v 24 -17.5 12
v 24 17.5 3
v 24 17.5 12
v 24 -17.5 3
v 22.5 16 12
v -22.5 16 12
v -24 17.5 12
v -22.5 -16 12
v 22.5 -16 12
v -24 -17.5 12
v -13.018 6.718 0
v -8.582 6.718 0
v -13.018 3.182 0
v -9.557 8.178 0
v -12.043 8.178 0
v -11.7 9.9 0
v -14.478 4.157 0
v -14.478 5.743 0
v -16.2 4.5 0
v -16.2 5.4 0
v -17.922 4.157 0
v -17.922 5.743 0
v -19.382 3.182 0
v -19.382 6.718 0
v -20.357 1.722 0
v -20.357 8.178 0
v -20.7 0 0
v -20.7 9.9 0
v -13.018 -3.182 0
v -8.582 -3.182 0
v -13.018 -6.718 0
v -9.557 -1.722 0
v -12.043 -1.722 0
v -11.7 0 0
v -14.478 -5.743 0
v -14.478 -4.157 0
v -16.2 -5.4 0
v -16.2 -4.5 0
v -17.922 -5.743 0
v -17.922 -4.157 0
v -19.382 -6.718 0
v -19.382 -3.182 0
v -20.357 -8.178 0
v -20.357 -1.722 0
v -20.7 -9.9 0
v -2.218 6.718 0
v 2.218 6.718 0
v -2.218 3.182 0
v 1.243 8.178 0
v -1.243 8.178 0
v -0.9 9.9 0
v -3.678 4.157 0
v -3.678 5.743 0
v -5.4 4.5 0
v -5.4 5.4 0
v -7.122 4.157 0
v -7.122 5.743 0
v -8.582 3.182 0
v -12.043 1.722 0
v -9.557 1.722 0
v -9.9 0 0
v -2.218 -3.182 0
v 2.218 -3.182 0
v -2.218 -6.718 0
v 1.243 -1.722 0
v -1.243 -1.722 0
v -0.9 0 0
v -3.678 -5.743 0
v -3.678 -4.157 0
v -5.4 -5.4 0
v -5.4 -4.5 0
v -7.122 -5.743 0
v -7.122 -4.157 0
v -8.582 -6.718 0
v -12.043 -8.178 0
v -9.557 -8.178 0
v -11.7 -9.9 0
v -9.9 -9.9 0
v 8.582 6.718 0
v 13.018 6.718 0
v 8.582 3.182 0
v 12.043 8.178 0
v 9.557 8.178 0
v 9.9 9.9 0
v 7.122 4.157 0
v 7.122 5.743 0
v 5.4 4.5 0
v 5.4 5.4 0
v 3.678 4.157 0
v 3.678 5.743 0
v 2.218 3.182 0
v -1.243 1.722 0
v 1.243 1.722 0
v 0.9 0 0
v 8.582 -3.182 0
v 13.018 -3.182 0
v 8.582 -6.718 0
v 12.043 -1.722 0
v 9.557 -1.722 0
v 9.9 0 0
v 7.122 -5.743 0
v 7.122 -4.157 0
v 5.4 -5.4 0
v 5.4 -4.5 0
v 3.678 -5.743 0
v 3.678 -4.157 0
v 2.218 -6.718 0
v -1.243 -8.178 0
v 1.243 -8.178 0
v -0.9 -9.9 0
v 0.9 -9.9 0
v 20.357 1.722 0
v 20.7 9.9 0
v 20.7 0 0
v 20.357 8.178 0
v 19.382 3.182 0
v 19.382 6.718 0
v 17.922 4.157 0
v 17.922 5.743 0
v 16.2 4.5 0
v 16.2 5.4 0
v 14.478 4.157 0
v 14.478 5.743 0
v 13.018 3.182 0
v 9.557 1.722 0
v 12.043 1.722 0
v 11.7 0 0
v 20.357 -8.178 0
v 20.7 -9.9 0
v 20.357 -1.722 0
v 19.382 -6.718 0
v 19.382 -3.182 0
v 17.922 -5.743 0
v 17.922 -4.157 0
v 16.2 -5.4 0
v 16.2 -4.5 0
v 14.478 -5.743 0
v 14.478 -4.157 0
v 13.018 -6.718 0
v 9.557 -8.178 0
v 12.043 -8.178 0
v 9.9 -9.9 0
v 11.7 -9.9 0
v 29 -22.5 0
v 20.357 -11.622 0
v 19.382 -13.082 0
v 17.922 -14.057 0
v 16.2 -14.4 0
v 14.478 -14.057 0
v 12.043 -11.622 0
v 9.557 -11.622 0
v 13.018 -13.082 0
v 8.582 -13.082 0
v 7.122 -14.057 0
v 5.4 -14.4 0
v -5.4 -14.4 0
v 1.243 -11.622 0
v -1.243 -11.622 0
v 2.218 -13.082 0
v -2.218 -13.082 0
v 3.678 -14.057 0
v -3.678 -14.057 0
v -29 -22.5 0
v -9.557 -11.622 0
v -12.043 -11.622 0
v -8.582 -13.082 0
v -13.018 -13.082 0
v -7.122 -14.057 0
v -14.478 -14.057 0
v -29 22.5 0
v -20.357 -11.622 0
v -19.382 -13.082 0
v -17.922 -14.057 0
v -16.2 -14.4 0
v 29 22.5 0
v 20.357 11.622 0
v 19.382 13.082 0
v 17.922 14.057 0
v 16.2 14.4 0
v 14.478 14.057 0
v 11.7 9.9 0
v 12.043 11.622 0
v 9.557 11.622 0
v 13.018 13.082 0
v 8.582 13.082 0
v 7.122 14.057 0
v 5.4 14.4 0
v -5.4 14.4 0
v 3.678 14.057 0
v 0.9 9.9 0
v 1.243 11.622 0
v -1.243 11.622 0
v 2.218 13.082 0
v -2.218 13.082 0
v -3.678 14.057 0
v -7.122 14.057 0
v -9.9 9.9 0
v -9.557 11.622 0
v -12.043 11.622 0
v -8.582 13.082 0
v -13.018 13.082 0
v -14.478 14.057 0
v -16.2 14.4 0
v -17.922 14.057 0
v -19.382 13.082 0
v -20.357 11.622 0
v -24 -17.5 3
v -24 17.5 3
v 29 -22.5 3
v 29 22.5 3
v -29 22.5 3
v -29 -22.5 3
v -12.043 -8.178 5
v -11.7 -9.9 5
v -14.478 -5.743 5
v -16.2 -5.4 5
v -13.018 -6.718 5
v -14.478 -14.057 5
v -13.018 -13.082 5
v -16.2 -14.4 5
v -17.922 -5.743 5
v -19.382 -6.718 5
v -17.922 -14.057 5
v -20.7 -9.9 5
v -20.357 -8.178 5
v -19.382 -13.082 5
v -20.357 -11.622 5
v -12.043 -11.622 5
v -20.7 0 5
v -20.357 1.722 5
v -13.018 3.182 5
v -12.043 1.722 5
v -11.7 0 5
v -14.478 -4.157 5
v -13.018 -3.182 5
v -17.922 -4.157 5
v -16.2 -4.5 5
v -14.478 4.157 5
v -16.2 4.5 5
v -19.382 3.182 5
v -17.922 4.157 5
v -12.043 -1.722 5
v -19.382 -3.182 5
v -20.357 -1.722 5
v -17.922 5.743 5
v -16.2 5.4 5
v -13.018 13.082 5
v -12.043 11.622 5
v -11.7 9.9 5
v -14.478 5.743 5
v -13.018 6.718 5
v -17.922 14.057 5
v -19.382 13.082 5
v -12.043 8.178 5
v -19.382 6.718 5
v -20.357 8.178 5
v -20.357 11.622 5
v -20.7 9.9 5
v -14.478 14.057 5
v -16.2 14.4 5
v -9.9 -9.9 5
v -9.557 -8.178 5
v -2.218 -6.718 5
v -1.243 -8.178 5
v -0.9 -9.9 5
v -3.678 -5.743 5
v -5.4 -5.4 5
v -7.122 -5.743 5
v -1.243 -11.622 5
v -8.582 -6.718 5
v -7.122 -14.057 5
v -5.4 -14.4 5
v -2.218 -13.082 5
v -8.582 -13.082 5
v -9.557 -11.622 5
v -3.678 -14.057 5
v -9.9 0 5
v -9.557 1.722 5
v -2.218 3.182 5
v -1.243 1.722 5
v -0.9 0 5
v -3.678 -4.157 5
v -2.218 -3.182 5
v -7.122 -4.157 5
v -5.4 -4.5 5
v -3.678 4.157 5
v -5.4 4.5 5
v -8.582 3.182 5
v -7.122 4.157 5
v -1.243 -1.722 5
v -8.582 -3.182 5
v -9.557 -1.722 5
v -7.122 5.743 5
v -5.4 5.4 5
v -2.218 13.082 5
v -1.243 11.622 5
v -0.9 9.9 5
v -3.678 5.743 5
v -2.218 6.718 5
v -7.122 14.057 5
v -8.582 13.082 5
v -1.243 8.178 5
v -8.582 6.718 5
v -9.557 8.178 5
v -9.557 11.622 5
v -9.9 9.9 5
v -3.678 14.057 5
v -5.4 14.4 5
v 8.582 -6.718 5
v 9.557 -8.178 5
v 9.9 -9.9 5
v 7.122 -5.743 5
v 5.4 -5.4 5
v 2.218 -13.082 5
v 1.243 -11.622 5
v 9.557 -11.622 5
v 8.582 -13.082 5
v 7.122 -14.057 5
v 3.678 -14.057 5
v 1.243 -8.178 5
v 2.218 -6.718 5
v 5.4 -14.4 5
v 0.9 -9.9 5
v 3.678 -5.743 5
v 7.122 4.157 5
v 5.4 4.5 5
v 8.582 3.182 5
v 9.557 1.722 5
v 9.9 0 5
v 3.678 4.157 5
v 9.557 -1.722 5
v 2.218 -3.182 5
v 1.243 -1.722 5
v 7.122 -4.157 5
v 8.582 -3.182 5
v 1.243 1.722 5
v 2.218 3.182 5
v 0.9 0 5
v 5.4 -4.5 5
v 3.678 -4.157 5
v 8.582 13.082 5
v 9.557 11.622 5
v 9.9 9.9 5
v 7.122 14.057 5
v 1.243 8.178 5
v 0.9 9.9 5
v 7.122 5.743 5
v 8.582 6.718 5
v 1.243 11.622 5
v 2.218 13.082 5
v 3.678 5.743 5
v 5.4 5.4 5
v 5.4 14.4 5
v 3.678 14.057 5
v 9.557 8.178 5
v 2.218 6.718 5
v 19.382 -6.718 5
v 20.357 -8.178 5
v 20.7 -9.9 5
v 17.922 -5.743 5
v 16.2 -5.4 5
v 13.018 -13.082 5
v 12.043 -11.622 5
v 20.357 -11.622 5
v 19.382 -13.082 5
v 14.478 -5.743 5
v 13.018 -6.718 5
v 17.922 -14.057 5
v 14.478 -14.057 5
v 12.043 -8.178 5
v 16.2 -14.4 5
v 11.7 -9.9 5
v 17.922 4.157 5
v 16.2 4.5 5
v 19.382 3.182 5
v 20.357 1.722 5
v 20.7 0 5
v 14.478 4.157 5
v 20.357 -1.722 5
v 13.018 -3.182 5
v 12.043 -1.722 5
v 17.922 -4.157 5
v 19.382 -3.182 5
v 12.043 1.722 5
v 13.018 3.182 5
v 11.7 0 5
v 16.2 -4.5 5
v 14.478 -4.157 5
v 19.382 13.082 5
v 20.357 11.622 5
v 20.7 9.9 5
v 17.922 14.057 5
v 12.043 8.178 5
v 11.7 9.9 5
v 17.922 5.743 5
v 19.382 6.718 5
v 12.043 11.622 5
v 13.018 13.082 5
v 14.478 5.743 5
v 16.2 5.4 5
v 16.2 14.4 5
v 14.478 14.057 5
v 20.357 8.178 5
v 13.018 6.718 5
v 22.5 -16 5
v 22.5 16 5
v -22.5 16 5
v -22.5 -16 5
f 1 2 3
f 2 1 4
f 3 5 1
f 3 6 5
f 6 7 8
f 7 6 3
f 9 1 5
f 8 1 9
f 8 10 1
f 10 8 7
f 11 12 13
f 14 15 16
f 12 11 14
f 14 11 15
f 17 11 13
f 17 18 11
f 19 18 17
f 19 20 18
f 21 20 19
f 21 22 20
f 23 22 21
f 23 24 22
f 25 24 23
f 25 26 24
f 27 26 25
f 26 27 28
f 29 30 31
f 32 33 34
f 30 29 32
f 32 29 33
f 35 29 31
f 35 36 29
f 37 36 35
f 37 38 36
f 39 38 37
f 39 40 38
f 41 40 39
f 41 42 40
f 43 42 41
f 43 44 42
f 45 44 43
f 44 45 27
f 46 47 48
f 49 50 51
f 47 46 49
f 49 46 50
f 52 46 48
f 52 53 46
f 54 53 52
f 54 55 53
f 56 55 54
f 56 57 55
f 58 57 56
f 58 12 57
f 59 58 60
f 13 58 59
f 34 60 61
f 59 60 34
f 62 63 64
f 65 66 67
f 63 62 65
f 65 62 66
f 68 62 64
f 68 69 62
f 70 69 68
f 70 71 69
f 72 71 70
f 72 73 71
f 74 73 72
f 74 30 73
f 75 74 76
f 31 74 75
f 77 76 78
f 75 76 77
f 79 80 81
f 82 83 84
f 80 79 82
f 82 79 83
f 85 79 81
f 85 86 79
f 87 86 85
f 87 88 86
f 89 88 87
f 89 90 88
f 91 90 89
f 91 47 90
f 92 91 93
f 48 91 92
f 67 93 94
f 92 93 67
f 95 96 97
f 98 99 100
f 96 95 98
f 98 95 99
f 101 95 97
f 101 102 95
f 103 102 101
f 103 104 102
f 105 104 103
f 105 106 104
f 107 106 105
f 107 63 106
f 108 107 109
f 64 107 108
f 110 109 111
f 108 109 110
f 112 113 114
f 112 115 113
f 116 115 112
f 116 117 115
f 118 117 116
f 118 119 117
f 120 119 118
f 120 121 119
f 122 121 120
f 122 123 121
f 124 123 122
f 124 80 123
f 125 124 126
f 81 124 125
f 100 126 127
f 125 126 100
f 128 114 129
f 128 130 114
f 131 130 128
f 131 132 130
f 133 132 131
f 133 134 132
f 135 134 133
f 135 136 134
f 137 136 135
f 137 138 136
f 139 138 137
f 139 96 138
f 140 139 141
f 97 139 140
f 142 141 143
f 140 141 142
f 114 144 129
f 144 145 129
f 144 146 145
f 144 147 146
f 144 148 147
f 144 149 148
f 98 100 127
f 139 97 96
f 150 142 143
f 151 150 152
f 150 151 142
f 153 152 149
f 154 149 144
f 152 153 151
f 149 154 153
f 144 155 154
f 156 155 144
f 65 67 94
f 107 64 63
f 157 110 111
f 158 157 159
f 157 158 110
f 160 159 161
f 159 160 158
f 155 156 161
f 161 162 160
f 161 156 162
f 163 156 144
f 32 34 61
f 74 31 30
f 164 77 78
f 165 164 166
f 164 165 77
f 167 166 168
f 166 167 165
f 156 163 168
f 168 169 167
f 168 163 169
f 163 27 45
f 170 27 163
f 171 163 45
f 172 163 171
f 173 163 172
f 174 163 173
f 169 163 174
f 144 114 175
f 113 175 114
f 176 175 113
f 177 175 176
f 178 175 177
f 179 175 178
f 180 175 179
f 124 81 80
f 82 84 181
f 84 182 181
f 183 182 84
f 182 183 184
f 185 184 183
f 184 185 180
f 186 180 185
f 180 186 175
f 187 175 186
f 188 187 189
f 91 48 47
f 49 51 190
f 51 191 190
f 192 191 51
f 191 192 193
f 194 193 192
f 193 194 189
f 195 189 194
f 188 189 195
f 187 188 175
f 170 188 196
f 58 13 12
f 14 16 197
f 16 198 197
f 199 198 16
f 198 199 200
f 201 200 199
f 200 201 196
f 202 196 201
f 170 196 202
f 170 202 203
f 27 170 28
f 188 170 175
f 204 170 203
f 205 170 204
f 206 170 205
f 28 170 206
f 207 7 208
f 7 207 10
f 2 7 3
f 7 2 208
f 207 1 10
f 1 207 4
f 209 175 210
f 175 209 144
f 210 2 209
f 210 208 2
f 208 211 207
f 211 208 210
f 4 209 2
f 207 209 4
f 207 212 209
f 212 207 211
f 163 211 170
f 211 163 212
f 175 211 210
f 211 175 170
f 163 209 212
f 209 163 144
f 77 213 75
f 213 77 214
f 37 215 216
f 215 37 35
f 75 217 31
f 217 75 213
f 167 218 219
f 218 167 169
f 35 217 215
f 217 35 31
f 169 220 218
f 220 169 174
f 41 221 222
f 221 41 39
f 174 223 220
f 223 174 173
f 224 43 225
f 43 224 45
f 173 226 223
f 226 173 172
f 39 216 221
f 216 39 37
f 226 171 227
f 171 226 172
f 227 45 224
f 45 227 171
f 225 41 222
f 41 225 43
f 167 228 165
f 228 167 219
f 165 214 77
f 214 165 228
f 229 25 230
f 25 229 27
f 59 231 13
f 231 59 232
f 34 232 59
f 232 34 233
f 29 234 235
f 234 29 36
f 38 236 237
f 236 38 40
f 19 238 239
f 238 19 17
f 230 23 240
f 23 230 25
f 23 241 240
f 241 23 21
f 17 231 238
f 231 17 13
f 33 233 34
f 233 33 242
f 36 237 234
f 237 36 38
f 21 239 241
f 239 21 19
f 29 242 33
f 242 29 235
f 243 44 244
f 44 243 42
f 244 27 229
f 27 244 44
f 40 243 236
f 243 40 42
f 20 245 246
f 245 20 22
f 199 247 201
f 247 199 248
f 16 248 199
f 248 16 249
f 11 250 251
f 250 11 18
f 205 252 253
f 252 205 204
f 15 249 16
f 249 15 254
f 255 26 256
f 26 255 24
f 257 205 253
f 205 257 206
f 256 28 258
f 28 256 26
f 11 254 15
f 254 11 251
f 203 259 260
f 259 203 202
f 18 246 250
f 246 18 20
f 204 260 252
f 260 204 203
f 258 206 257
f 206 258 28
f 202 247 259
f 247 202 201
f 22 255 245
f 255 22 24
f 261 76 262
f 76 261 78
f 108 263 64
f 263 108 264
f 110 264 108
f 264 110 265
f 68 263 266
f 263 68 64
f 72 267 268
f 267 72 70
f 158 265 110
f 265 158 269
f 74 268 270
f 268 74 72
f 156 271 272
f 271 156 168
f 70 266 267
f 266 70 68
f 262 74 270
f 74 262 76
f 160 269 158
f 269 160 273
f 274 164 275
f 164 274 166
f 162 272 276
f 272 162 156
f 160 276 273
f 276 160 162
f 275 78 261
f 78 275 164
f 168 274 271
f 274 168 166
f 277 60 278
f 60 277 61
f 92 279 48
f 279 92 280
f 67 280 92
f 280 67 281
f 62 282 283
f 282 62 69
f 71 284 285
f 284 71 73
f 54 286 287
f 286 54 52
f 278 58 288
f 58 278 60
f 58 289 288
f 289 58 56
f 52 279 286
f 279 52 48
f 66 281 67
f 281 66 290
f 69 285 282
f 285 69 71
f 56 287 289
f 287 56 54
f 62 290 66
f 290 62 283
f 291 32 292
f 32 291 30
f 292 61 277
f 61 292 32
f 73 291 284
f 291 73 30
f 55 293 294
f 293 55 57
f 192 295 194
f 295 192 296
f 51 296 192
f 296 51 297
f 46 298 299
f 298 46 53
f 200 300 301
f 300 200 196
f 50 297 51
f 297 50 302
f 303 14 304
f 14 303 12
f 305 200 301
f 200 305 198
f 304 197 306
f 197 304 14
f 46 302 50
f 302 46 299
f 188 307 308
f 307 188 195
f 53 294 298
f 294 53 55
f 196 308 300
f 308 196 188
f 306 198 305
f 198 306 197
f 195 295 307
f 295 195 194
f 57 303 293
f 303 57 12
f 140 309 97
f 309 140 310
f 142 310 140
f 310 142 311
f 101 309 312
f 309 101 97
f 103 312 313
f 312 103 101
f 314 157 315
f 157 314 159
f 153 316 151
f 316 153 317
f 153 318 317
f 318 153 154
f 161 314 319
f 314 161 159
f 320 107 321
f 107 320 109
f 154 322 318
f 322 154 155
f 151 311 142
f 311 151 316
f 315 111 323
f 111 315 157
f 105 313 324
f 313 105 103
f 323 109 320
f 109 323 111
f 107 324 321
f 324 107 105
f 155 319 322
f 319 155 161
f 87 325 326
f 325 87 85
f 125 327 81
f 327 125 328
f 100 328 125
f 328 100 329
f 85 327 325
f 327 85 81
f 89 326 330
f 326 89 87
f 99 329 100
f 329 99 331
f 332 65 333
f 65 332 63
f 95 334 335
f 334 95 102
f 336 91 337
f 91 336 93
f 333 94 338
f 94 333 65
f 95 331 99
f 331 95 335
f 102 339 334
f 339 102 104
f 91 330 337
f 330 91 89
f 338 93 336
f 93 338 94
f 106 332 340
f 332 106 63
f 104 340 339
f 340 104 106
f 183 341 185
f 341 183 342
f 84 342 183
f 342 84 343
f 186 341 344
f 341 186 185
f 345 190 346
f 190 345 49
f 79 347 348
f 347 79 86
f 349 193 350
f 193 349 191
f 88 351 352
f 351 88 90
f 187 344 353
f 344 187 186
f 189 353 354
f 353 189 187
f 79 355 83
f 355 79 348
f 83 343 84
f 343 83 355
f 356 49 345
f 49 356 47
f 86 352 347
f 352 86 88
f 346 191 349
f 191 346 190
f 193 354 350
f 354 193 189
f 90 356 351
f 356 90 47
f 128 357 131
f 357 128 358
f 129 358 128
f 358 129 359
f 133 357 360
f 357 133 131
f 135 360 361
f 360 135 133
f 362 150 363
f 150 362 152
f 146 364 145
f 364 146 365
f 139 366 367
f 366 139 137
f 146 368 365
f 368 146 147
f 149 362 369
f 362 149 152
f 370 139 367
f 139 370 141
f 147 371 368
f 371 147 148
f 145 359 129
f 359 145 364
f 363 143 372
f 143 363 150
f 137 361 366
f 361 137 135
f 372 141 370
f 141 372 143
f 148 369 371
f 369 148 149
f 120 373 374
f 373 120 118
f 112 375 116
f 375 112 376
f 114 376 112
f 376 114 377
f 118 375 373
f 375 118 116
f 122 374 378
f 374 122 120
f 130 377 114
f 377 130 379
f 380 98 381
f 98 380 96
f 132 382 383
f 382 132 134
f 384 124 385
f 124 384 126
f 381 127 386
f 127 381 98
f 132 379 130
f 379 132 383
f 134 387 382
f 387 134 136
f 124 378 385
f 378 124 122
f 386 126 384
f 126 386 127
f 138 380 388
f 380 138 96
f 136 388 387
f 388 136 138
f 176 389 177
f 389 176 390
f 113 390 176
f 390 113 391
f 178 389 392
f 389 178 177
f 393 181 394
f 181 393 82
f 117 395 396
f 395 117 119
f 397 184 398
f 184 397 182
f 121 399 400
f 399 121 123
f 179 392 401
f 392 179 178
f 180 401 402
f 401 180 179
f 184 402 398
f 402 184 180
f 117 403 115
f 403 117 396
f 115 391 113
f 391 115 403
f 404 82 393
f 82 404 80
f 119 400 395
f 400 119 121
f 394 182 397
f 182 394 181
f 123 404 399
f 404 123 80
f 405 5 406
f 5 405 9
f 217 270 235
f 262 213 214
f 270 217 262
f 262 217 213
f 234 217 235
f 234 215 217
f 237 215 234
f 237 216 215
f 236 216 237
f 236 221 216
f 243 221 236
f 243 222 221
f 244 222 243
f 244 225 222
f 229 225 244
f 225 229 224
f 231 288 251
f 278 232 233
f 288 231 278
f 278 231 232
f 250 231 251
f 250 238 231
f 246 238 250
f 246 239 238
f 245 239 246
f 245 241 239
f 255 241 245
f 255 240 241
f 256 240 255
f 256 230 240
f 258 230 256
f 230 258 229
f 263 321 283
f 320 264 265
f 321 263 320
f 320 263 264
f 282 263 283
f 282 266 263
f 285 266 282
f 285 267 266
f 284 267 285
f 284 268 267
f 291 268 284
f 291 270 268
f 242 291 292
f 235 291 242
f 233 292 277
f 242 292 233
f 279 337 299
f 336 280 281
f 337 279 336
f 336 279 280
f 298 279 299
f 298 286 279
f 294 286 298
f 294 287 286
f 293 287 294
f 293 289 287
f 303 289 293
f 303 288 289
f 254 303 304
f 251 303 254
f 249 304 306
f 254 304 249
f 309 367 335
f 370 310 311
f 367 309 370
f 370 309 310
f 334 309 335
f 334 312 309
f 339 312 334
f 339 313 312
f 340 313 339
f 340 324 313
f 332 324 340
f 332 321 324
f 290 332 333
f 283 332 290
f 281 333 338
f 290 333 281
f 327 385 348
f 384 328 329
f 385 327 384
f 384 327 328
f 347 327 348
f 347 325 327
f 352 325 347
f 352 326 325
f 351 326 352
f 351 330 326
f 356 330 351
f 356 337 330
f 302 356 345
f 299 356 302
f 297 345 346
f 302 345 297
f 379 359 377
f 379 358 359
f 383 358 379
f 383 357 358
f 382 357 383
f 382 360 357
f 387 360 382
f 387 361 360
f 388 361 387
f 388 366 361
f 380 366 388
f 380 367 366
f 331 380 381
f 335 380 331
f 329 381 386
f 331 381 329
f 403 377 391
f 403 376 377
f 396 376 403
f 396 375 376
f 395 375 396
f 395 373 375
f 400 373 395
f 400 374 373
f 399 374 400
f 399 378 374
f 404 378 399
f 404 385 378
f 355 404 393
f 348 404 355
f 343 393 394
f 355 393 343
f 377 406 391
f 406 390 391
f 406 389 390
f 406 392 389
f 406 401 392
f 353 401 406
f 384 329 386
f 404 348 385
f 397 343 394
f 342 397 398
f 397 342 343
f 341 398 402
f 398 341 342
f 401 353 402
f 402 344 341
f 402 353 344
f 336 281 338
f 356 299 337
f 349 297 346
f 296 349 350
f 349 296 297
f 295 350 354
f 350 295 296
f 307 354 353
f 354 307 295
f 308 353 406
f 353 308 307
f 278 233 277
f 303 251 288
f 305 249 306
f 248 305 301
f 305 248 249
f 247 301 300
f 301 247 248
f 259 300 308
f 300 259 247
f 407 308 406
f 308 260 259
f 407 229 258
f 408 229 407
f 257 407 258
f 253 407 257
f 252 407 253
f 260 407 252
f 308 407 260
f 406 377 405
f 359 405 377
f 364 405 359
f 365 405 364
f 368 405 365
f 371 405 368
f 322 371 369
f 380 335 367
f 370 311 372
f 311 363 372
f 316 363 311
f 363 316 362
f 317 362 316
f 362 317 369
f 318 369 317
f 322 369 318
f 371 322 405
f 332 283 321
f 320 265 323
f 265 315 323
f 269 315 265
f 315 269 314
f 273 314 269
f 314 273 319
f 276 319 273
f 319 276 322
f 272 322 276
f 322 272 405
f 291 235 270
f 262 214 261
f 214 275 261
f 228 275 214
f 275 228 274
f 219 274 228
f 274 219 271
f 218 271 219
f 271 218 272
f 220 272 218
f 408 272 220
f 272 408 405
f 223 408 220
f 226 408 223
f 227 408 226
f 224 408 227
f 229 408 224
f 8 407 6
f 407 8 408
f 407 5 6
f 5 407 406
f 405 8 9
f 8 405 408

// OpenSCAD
// Height of the lip
outer_height = 7; // [3:25]
// Leveling adjustment
inner_height = 5;  // [2:20]
// Thickness of the foot
foot_thickness = 3; // [2:10]

difference() {
    union() {
        translate([-48/2,-35/2,0]) cube([48,35,outer_height+inner_height]);
        translate([-58/2,-45/2,0]) cube([58,45,foot_thickness]);
    }

    // foot cutout
    union() {
        translate([-45/2,-32/2,inner_height]) cube([45,32,outer_height + 1]);
        for (i=[-3:2:3]) {
            for (j=[-2:2:2]) {
                scale(0.9) translate([i*6,j*5.5,-10]) cylinder(r=5,h=120);
            }
        }
    }
}
